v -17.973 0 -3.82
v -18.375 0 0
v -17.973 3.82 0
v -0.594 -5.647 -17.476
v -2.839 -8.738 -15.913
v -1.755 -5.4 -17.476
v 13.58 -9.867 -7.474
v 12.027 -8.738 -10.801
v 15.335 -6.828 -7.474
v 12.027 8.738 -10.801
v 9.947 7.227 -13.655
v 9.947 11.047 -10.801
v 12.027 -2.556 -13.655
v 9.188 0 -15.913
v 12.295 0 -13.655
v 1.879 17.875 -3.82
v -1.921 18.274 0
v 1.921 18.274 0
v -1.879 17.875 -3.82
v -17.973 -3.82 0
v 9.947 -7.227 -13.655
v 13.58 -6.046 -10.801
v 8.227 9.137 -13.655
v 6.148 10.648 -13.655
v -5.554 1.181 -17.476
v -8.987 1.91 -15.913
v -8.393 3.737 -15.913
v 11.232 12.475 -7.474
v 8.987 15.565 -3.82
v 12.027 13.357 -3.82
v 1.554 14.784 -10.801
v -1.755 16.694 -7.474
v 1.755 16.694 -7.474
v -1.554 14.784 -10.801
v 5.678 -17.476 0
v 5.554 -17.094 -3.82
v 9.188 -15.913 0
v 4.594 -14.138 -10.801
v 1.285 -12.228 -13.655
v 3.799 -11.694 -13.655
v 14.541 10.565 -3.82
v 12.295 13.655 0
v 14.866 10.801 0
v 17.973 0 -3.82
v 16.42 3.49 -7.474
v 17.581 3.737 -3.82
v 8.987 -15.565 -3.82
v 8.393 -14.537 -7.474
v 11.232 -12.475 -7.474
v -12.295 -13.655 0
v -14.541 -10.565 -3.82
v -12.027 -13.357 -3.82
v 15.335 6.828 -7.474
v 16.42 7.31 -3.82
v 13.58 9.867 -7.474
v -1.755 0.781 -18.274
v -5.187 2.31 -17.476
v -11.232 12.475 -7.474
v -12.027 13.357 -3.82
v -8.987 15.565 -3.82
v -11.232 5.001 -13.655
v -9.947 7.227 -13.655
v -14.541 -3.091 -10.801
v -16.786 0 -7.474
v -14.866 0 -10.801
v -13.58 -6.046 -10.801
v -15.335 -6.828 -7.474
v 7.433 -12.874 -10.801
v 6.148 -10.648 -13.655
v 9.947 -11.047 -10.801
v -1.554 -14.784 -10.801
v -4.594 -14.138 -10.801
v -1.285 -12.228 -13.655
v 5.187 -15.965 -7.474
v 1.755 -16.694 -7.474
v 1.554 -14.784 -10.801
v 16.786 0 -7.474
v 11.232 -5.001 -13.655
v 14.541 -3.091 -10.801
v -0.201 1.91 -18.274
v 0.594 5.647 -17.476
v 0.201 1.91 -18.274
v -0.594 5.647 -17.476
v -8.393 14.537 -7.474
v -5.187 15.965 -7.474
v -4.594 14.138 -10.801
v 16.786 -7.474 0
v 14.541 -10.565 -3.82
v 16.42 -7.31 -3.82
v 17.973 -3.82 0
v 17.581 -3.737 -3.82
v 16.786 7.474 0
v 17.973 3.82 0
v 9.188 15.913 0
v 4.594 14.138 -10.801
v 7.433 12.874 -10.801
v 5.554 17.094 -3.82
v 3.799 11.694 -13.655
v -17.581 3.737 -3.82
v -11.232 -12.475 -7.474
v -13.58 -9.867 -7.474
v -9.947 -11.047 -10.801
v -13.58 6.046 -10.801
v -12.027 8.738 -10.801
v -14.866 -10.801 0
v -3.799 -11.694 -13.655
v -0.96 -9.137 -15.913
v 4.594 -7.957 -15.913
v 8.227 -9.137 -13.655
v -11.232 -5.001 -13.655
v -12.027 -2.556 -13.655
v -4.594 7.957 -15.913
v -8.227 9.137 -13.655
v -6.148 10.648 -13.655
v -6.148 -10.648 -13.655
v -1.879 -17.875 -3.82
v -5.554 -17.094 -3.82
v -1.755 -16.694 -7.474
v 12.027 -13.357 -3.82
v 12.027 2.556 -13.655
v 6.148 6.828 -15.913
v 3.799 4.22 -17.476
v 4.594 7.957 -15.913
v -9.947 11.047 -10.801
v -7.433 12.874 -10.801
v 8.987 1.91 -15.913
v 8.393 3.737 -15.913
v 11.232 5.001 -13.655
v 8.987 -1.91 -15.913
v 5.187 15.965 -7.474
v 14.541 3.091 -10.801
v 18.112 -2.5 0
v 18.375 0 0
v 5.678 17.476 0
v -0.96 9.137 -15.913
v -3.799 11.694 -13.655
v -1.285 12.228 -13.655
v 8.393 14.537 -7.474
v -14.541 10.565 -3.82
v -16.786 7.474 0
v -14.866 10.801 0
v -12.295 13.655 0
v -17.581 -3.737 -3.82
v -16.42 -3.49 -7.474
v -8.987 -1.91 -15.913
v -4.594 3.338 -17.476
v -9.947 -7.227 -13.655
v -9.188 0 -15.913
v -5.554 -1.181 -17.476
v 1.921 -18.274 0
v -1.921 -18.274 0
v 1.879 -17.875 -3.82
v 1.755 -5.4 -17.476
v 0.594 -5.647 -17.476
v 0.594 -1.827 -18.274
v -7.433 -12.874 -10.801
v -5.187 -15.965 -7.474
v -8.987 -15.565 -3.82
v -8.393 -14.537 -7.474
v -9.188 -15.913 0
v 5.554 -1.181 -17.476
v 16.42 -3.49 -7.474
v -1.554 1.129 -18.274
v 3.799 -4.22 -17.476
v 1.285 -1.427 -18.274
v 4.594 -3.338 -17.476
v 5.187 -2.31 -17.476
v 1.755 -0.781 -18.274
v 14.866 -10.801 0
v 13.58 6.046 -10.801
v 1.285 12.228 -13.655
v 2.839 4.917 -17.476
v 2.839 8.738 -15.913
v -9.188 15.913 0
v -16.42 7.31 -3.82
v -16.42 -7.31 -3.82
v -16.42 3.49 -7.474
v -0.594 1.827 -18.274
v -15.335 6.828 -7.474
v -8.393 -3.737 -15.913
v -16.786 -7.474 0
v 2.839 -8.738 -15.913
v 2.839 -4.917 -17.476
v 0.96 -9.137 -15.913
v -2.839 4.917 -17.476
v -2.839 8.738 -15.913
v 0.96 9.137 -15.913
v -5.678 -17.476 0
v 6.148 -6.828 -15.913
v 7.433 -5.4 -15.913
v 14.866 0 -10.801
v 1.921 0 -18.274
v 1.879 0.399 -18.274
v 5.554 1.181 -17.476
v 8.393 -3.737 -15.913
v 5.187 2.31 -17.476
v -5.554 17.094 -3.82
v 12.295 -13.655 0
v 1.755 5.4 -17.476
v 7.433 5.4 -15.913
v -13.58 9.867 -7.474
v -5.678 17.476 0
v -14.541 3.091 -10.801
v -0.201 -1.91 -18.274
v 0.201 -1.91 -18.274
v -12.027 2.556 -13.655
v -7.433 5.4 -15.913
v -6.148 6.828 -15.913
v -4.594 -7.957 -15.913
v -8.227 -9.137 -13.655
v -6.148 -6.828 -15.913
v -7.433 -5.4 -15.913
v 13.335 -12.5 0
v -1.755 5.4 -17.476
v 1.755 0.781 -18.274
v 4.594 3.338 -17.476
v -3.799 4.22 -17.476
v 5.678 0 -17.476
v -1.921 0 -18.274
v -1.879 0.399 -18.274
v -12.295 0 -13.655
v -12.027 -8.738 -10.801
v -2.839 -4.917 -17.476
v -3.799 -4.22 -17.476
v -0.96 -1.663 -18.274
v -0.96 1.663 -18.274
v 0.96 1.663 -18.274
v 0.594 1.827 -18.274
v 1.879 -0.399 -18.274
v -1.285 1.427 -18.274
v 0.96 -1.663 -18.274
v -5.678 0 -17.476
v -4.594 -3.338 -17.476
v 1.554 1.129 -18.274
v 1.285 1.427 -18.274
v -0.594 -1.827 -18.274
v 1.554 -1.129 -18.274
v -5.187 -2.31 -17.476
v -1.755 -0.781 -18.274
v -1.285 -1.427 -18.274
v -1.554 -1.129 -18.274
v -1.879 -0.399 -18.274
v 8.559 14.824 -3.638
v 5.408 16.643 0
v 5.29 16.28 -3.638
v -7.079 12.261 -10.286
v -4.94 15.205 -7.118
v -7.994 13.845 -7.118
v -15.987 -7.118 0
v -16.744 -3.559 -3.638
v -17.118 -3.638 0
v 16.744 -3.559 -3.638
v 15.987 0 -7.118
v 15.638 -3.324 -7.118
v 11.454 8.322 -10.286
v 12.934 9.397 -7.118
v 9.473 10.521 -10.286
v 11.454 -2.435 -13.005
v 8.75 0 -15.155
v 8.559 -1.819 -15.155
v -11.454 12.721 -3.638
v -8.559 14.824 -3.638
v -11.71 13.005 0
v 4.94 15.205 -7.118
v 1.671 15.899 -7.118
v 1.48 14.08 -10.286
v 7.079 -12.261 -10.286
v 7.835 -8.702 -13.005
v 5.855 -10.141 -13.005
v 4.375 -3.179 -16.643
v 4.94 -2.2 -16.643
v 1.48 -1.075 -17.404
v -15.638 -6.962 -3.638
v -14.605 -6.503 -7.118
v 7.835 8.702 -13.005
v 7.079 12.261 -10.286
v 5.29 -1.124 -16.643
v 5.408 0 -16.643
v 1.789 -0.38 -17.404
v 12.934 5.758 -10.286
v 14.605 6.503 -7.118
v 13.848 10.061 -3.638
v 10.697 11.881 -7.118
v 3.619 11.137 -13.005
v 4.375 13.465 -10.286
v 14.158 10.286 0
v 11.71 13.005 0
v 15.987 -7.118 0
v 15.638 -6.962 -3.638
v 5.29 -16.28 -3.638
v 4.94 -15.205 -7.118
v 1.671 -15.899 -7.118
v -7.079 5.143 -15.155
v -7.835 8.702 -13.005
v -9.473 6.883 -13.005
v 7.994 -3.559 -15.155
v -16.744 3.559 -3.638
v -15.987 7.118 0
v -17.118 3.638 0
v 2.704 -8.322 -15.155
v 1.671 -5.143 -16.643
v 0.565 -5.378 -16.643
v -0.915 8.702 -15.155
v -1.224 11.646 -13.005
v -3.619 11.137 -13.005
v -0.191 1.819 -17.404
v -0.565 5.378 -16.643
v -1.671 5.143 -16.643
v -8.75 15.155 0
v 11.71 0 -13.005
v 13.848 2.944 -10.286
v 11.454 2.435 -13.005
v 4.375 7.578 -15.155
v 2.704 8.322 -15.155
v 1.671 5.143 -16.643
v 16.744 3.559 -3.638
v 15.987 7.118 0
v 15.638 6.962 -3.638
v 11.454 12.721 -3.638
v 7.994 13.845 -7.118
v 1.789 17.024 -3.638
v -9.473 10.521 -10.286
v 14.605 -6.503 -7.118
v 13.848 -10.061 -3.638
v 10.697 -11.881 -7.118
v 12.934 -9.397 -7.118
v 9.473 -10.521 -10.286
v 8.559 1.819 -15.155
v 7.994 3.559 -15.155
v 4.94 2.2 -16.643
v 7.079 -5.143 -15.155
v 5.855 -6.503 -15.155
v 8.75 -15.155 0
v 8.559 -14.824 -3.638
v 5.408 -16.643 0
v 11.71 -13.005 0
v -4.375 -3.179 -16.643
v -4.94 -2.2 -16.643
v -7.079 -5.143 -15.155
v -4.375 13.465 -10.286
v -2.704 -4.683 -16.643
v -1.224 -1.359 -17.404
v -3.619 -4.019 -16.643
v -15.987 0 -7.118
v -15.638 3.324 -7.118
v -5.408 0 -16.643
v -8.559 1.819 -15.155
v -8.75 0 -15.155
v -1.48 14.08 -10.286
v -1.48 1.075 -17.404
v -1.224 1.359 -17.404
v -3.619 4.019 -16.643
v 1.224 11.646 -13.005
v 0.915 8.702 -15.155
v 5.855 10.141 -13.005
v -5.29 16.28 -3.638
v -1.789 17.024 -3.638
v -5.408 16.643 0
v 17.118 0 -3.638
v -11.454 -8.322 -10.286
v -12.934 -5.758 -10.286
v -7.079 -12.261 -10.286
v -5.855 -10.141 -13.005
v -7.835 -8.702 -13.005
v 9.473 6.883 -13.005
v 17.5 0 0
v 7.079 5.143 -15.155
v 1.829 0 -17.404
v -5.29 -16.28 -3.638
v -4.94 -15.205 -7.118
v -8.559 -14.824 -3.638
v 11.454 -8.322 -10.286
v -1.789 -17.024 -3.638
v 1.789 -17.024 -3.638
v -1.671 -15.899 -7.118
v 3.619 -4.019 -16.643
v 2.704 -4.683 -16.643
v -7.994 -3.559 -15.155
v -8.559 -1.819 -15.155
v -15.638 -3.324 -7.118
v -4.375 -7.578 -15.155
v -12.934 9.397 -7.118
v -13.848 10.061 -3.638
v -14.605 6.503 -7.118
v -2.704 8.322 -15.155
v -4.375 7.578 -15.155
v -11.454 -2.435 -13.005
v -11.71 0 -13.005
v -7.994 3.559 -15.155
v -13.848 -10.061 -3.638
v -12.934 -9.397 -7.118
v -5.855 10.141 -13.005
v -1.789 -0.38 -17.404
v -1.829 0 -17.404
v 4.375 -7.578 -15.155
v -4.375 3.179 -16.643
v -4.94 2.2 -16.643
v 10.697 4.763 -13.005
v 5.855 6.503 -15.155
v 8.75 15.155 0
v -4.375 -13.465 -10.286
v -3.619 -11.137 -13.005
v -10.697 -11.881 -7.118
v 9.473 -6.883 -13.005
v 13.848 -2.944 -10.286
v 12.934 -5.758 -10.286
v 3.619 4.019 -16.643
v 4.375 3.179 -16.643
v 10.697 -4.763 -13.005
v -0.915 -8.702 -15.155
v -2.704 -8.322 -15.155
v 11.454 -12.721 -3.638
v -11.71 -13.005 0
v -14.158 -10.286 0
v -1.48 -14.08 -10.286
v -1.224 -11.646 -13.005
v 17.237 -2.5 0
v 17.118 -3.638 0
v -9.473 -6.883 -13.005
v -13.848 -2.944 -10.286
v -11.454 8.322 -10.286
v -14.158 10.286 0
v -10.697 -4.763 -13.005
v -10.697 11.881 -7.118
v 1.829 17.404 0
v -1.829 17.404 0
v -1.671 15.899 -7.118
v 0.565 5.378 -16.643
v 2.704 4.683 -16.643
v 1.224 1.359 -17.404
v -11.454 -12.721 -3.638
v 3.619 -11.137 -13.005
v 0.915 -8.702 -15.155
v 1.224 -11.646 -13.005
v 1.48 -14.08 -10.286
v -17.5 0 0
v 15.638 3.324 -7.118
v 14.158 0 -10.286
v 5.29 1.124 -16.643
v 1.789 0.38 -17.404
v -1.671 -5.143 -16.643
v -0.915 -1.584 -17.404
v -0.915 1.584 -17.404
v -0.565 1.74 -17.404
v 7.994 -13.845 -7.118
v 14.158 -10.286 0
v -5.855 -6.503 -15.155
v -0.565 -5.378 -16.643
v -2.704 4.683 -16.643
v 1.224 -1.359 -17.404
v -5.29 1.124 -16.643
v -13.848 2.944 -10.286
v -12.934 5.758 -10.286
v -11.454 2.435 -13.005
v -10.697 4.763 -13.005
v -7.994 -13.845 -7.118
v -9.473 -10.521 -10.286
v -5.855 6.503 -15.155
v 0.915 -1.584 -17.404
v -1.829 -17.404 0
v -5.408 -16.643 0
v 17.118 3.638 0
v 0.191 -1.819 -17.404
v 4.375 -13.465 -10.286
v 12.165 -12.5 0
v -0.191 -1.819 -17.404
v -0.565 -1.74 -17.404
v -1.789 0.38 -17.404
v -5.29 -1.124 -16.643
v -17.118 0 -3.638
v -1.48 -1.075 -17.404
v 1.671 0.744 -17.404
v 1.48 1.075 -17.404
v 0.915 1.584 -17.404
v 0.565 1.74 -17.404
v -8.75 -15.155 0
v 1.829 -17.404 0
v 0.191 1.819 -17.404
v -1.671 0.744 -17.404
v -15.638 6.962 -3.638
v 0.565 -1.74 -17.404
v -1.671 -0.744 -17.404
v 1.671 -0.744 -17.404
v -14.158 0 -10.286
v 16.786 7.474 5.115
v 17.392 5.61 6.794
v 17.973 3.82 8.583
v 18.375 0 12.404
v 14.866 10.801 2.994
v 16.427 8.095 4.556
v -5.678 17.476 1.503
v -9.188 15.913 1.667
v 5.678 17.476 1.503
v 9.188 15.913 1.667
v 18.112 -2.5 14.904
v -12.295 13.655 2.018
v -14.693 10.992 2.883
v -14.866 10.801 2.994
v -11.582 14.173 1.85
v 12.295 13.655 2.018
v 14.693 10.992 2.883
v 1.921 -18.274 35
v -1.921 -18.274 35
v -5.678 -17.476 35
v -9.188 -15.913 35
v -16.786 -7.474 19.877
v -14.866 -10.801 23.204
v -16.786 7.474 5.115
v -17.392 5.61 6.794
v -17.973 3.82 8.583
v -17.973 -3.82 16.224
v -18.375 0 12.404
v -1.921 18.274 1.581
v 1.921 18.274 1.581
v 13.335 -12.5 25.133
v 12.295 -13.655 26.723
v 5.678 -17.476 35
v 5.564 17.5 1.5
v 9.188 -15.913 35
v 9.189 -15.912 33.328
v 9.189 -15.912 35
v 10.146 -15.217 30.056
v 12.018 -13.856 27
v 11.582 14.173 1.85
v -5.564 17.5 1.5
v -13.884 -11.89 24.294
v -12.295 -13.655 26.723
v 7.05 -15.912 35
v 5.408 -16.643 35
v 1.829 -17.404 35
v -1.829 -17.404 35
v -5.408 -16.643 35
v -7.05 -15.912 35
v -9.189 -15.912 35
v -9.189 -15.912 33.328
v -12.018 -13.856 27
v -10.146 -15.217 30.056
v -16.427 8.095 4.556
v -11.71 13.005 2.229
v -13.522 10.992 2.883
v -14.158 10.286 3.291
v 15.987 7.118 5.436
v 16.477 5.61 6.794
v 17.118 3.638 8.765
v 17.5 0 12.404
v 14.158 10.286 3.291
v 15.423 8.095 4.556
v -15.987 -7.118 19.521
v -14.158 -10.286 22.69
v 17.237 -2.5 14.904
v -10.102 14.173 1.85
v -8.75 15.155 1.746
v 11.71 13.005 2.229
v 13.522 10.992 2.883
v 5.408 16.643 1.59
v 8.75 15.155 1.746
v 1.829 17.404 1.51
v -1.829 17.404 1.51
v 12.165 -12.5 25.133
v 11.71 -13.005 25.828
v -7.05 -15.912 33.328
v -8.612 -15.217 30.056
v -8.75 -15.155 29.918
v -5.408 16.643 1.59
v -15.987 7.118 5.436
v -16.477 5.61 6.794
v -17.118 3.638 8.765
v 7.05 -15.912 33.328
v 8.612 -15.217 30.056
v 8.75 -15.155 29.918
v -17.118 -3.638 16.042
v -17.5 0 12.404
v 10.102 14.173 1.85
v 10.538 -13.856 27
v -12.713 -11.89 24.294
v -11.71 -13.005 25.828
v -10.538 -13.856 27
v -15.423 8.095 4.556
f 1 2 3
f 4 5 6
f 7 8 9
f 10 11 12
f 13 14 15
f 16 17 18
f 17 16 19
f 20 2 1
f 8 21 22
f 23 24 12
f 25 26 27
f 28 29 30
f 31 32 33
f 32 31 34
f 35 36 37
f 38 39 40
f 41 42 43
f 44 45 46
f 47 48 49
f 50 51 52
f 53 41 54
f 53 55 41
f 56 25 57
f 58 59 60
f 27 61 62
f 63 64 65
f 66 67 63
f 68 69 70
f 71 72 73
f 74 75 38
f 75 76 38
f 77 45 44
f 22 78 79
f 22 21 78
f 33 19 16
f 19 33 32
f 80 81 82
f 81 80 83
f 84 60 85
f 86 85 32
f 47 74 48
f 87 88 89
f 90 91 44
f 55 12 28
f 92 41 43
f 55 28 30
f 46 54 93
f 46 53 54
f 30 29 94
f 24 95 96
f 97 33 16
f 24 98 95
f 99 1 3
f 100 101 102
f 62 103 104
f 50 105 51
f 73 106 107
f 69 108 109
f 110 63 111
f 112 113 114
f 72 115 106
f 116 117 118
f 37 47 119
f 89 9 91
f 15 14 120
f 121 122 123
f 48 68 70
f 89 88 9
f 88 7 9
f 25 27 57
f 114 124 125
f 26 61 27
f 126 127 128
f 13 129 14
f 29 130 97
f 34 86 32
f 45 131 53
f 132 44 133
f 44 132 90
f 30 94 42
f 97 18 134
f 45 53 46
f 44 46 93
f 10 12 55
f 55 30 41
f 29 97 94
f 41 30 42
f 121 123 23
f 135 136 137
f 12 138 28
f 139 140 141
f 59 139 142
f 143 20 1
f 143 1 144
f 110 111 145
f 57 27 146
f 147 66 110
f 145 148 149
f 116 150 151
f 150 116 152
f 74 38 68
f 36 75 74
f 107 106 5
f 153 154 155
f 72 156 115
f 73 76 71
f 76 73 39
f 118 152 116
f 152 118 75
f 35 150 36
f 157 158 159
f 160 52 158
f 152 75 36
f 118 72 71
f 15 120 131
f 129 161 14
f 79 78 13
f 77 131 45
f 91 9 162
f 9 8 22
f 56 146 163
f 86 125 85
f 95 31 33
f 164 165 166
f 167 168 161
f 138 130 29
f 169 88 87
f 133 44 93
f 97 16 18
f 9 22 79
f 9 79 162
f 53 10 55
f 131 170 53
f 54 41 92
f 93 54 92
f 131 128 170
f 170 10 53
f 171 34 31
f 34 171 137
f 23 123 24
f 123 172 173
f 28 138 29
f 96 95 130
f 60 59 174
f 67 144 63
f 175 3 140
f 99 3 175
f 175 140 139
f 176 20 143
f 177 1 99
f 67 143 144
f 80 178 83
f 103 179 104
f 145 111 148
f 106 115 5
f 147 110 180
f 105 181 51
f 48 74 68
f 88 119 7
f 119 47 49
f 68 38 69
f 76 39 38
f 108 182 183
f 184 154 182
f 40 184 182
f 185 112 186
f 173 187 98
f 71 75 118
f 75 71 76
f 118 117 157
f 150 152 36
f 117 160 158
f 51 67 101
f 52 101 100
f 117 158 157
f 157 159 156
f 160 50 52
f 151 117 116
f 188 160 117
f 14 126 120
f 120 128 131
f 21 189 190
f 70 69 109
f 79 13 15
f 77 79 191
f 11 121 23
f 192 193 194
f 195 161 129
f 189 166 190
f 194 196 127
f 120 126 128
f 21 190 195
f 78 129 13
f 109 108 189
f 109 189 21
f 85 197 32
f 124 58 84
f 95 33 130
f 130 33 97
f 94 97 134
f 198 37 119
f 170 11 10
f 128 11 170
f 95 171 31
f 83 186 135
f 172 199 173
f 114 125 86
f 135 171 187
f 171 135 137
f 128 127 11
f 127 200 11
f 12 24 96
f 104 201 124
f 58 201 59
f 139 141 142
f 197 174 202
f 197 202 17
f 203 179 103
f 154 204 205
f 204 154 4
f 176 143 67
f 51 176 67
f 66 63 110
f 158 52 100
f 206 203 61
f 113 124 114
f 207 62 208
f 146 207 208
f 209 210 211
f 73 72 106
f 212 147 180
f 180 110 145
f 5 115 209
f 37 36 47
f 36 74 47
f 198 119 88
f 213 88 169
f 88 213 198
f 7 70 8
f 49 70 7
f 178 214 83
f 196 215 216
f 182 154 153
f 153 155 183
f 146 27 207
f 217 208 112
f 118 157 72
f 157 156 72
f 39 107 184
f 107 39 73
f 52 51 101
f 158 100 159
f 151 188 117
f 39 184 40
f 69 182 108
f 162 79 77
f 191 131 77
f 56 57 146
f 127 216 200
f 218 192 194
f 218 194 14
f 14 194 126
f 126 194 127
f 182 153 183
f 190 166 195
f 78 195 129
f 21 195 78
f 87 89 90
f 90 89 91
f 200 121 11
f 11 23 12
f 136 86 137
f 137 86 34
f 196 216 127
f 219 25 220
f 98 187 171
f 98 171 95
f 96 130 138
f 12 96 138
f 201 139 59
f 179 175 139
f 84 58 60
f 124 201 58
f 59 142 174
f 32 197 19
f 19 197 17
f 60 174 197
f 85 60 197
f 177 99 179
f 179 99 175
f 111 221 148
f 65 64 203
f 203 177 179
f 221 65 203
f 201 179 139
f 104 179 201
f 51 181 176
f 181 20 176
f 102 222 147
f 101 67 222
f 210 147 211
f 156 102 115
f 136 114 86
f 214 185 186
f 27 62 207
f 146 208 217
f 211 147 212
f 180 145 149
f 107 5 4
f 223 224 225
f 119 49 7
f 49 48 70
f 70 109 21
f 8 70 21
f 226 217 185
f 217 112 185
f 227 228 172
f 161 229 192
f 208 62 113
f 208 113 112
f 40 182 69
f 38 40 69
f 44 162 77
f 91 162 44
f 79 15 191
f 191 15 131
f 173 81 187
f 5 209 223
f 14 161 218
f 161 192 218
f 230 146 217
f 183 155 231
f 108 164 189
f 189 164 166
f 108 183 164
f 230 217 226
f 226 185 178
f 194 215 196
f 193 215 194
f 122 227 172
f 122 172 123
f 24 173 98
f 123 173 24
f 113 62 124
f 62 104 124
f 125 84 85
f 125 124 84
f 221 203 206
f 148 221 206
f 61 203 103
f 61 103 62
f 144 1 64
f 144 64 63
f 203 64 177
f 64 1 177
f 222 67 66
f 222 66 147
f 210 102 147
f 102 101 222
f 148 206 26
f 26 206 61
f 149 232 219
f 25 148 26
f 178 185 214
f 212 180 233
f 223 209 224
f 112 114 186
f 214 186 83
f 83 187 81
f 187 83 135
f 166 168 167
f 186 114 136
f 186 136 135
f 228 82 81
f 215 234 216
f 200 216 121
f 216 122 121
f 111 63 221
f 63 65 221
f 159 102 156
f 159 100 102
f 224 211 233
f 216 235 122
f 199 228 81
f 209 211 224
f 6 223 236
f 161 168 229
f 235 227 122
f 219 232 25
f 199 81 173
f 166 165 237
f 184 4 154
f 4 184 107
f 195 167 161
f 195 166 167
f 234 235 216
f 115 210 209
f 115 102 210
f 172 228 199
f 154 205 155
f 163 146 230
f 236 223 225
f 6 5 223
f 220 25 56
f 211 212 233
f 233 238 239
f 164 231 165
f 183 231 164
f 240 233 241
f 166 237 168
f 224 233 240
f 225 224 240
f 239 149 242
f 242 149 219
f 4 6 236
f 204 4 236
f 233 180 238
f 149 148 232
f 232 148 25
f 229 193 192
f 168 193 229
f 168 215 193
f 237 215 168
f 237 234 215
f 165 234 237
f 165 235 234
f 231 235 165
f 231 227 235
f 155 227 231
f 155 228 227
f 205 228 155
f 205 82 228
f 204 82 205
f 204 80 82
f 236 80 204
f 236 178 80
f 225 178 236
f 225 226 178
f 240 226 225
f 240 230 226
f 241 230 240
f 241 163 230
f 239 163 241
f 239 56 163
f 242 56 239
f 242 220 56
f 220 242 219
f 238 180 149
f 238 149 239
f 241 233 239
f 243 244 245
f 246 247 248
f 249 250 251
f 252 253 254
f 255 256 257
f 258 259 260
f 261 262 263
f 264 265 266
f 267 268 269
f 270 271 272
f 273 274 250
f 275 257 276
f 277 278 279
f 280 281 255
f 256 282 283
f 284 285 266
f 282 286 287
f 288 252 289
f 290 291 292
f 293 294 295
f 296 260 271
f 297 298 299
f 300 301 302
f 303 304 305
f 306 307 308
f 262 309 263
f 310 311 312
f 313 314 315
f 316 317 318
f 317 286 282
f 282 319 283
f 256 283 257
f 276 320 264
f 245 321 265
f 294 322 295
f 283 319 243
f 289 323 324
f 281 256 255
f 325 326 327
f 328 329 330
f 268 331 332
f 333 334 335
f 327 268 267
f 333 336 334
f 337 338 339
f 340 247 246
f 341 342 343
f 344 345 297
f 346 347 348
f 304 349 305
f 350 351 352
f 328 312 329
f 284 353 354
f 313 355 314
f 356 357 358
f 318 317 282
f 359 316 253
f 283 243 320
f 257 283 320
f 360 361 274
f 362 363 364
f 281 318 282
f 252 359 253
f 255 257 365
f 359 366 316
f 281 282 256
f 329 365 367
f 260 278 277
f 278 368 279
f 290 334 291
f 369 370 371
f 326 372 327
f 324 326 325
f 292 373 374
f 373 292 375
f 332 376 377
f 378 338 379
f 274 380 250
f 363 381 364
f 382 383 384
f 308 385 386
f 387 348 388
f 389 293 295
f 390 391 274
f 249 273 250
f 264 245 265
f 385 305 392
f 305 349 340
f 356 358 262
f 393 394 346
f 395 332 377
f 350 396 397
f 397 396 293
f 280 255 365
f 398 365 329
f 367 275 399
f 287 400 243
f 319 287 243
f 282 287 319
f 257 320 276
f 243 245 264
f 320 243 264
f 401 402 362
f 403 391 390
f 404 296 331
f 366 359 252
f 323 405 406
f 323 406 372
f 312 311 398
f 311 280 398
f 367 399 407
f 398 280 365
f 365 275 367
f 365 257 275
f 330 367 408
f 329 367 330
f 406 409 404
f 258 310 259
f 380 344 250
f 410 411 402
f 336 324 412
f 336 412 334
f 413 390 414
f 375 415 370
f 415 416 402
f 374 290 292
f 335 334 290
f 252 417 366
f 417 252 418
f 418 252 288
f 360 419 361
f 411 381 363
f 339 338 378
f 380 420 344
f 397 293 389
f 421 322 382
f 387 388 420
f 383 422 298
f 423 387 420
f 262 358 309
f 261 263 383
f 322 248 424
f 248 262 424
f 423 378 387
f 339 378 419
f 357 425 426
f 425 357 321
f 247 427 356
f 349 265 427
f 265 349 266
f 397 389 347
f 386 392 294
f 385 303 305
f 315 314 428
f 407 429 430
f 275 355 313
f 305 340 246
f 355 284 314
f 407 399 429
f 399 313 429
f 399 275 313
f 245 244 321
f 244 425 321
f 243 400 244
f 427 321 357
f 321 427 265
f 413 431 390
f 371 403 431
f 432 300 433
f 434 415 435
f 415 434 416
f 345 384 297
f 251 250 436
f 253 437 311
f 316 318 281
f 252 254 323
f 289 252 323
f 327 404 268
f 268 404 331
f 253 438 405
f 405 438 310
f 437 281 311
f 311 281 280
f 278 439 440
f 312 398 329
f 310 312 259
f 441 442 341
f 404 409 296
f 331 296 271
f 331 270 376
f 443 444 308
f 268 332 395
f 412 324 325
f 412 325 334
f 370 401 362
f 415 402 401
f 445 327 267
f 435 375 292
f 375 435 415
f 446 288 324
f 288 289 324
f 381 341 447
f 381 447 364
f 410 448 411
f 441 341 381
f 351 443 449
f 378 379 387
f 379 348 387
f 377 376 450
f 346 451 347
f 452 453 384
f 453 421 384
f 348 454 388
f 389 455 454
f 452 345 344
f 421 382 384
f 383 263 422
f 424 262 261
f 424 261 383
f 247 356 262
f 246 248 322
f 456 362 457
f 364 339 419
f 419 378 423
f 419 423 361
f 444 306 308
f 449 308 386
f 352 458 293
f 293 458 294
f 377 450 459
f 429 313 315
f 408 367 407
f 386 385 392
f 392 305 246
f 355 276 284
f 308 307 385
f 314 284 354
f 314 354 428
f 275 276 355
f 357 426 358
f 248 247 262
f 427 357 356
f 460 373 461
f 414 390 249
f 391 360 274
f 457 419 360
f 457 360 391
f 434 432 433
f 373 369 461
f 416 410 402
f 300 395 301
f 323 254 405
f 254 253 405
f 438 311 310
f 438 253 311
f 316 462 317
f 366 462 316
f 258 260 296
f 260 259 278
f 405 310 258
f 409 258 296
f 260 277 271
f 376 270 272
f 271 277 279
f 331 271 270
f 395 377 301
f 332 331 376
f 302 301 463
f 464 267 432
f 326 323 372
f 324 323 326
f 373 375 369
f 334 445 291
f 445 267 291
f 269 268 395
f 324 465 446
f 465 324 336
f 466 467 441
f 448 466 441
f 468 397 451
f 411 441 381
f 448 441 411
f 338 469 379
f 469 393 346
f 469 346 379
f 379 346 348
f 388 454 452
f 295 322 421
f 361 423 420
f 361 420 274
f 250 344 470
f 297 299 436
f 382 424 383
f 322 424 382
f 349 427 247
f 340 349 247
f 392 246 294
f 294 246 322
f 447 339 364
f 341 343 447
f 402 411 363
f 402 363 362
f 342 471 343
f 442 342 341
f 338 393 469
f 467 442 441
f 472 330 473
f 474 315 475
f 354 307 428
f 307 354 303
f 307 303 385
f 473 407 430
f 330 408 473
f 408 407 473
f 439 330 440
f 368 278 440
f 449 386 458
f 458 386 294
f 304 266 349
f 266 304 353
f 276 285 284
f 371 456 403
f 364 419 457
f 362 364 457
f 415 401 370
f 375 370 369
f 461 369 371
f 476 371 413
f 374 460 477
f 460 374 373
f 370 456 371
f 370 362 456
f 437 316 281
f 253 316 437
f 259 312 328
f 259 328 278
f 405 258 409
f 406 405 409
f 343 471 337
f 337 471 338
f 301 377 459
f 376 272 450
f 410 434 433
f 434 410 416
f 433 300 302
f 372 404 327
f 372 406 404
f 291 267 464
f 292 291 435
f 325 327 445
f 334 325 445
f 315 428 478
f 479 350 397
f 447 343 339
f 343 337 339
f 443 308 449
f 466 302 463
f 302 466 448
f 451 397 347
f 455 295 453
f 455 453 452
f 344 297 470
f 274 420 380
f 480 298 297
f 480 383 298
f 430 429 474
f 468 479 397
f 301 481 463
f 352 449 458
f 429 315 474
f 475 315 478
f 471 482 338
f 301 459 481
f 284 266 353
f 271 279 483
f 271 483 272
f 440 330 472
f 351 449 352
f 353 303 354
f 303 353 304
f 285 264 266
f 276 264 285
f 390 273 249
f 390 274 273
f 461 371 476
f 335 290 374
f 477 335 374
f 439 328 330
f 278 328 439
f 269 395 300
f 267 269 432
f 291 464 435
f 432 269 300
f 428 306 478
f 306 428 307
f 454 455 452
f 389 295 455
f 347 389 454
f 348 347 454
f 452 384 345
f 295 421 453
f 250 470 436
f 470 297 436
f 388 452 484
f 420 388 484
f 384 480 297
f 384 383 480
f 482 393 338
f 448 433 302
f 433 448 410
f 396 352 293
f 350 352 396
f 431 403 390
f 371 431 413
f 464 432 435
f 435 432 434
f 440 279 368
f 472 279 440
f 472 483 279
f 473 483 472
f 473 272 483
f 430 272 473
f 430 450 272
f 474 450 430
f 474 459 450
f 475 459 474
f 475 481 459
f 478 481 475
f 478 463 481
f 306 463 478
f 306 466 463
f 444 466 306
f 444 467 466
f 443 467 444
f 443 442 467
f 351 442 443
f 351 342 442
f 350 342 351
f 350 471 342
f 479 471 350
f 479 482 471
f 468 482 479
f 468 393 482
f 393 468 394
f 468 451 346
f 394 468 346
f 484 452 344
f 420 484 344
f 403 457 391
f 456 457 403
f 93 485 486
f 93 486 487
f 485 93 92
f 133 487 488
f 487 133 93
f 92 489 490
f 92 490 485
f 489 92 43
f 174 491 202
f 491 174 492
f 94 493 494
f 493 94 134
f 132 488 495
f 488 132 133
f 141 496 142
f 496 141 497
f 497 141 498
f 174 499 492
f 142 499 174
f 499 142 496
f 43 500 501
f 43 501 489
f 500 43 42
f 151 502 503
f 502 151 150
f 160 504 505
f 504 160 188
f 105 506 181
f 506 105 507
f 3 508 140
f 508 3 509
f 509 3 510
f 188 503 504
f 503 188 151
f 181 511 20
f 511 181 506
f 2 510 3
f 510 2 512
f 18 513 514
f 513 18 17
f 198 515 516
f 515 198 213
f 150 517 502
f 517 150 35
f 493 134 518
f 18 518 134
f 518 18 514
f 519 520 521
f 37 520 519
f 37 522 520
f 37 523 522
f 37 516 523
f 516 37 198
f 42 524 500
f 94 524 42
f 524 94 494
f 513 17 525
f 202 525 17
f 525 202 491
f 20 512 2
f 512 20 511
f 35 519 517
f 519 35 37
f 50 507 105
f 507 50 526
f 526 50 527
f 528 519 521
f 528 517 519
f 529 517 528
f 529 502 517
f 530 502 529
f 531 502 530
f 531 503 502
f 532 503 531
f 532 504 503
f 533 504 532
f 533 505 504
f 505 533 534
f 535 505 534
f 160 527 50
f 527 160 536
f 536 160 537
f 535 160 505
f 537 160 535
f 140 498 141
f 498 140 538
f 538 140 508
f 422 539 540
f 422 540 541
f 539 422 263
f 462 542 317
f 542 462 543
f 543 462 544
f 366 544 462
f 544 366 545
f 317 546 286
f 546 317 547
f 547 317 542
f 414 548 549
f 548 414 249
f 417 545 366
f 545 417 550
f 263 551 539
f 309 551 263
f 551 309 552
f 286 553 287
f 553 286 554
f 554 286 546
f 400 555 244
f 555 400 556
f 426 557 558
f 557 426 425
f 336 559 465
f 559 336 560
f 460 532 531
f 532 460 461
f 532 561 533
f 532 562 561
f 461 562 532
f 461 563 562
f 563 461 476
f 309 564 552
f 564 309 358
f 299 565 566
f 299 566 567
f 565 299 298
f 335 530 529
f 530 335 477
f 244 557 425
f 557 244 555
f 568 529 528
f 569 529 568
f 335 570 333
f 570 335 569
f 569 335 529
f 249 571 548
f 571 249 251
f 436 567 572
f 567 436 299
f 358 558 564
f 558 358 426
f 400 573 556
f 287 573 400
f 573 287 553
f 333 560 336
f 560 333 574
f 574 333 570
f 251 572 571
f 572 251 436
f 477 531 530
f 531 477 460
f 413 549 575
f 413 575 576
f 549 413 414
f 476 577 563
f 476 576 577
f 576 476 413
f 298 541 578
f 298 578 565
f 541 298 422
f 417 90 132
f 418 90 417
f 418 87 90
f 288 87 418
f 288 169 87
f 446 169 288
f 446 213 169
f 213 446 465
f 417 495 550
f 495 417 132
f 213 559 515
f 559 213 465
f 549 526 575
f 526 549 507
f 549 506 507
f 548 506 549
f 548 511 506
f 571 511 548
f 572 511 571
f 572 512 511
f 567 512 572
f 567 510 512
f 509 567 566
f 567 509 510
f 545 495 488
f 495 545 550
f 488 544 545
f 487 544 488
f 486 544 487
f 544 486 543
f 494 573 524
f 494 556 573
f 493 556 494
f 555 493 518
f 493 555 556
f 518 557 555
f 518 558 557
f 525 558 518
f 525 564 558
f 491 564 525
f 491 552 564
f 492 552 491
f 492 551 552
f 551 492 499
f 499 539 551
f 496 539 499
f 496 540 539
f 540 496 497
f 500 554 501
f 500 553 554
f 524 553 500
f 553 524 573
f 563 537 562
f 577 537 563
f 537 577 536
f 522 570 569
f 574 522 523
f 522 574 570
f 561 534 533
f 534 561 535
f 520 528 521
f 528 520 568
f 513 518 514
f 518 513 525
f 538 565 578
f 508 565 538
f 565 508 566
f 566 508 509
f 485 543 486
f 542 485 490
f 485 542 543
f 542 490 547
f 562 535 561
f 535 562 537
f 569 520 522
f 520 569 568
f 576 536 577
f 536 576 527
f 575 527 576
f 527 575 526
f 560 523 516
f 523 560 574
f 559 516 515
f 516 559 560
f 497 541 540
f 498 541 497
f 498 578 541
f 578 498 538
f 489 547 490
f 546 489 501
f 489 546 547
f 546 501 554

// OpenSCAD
module clamp(){
    
}


module shield(dia=35, length=15){
    
    wall_percent=1.05;
    
    difference(){
        union(){
            // dome
            difference(){
                sphere(d=dia*wall_percent);
                sphere(d=dia);
                translate([0,0,dia]){
                    cylinder(h=dia*2, d=dia*2, center=true);
                }
            }
            // side walls
            difference(){
                cylinder(h=dia, d=dia*wall_percent);
                translate([0,0,-1]){
                    cylinder(h=38+2, d=dia);
                }
            }
        }
        // connector cutout
        cutout=40;
        translate([20,-(dia/2-(20/2)),cutout/2]){
            cube([20,10,cutout],center=true);
        }
        // tire cutout
        hull(){
            // tire cutout
            translate([-50,dia/2,dia/2]){
                rotate([0,90,0]){
                    cylinder(d=32, h=100);
                }
            }
            translate([-50,0,dia]){
                rotate([0,90,0]){
                    cylinder(d=32, h=100);
                }
            }

        }
    }    
}


shield();
